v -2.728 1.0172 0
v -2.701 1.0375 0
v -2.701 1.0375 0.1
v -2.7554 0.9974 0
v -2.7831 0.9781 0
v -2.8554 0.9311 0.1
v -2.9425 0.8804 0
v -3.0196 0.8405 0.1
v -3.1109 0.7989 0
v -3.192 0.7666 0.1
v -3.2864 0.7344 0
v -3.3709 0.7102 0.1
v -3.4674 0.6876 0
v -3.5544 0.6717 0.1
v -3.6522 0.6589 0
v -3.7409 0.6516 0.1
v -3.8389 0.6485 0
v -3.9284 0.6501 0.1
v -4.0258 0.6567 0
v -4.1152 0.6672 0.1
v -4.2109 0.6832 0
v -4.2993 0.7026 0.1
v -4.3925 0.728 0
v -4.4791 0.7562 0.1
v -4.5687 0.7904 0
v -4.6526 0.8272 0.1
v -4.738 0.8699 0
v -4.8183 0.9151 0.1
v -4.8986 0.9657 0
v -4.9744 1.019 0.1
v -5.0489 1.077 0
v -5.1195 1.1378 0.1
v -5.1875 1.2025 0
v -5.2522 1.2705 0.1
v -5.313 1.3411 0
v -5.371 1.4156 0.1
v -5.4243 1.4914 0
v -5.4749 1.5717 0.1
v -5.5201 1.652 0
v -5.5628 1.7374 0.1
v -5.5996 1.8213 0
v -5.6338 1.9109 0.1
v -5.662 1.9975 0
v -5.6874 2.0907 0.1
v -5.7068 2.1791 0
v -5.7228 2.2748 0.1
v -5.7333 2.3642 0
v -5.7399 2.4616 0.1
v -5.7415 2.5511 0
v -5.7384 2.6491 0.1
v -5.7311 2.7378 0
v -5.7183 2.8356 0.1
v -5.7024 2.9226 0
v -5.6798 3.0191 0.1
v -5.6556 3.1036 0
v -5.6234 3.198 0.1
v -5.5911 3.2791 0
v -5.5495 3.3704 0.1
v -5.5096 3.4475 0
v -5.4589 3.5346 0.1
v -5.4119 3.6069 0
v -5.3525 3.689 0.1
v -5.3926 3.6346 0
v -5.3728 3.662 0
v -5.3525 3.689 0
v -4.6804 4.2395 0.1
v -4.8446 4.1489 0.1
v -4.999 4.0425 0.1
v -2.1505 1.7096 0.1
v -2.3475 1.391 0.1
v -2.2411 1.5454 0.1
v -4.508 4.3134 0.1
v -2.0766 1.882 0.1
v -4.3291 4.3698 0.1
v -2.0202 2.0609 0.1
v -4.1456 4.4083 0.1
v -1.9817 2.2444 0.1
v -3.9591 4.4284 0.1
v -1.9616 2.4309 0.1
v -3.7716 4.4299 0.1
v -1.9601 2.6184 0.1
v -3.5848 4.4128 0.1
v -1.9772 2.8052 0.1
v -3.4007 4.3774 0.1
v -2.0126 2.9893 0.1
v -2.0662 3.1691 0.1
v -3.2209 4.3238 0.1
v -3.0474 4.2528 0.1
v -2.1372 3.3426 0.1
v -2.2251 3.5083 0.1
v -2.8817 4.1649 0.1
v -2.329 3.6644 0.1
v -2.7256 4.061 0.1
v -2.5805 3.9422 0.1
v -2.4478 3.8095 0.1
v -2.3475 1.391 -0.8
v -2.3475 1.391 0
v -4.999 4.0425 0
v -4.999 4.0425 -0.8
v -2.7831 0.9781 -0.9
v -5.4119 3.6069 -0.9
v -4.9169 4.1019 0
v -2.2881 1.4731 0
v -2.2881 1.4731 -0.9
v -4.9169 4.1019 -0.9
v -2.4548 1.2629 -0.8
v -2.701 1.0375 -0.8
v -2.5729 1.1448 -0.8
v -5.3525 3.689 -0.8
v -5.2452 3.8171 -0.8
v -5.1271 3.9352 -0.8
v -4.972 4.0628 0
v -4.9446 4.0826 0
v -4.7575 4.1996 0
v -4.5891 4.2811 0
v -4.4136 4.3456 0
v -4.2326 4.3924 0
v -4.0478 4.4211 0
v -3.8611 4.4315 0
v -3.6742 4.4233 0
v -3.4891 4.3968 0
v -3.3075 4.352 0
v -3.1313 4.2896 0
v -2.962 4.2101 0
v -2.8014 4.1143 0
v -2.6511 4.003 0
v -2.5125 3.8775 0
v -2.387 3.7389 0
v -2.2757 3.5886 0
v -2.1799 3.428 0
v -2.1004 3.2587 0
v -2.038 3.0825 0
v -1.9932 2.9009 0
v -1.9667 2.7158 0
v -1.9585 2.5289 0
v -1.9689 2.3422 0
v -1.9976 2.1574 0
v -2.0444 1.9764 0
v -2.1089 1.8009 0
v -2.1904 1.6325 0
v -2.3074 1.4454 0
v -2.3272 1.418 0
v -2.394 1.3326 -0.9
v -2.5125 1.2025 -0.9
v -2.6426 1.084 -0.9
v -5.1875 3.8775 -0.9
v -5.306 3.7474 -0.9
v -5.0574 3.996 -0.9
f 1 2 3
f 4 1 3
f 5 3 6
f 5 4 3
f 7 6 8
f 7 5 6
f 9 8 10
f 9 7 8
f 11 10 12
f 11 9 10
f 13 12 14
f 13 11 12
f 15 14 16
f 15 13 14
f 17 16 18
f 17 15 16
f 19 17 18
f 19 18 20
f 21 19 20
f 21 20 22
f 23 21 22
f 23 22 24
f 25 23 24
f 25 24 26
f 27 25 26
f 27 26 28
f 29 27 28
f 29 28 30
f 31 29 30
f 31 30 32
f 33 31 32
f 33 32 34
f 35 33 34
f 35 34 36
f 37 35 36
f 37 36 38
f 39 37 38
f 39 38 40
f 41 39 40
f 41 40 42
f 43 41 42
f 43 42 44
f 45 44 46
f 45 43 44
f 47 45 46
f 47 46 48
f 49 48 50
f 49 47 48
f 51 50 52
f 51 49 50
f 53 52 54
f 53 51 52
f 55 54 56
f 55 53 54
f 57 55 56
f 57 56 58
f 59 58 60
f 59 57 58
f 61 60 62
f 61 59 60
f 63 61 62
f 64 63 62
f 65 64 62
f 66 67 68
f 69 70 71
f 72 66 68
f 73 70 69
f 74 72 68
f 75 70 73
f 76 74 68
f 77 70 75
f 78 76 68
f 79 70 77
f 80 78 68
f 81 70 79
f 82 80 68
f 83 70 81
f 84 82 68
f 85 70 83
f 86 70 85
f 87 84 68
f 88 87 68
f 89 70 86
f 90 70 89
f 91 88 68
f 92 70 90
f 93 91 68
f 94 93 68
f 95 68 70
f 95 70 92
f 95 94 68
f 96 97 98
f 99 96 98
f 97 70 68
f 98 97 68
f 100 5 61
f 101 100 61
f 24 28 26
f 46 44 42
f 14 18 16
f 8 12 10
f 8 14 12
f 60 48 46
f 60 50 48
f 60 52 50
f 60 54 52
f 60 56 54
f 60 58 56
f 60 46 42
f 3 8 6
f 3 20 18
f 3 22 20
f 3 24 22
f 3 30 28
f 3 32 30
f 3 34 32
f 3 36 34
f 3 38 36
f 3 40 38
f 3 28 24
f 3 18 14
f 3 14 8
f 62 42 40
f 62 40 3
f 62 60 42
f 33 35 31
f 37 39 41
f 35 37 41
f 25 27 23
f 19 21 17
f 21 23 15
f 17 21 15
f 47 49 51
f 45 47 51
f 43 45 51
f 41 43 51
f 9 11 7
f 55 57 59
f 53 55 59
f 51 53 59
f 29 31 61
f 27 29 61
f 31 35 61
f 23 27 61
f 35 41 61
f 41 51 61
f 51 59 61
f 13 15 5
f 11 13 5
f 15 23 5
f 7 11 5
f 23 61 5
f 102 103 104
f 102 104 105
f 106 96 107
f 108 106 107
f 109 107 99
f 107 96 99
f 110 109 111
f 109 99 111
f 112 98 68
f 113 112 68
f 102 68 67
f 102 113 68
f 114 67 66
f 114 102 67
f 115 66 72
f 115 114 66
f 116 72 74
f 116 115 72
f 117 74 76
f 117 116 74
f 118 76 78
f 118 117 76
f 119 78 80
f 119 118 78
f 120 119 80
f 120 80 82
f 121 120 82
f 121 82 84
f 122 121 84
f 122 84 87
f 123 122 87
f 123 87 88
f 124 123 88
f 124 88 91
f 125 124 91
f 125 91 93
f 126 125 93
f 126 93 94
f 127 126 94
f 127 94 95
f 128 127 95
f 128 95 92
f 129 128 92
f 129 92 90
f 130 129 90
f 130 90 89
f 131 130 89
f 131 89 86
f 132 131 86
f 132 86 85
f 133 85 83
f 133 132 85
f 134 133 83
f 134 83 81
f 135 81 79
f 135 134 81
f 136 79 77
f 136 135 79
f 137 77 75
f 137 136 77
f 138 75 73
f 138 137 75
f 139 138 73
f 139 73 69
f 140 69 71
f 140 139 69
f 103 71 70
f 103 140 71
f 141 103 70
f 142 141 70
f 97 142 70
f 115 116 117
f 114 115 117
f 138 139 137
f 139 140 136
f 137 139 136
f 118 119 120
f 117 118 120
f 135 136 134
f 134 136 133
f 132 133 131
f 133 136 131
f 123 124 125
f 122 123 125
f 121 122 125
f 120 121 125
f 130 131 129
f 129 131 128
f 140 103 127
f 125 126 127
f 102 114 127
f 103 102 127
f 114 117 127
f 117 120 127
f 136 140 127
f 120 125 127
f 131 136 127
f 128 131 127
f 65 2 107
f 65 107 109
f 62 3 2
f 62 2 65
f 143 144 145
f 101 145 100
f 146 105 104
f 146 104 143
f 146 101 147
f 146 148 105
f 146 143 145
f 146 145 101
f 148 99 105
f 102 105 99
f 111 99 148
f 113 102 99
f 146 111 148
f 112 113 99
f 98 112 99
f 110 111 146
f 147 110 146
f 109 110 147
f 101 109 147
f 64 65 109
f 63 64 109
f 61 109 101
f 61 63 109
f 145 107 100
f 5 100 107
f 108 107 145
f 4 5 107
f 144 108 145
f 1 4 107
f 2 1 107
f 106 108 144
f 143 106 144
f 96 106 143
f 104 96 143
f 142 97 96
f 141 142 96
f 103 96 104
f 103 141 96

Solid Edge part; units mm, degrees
sketch "Sketch1" plane through (0, 0, 0) normal (0, 0, 1) x (1, 0, 0)
  circle A0 centre (-3.85, 2.54) radius 1.8915
extrude "Protrusion1" add sketch "Sketch1" along normal blind 0.1
sketch "Sketch2" plane through (-3.85, 2.54, 0.1) normal (0, 0, 1) x (0, 1, 0)
  line L0 (-1.5619, -1.0669) -> (1.0669, 1.5619)
  arc A0 (1.0669, 1.5619) -> (1.5619, 1.0669) centre (0, 0) cw
  line L1 (-1.0669, -1.5619) -> (1.5619, 1.0669)
  arc A1 (-1.0669, -1.5619) -> (-1.5619, -1.0669) centre (0, 0) cw
extrude "Ausprägung_2" add sketch "Sketch2" against normal blind 1
sketch "Sketch3" plane through (-3.85, 2.54, 0.1) normal (0, 0, 1) x (0, 1, 0)
  line L0 (-1.5025, -1.149) -> (1.149, 1.5025)
  line L1 (-1.149, -1.5025) -> (1.5025, 1.149)
  arc A0 (-1.149, -1.5025) -> (-1.5025, -1.149) centre (0, 0) cw
  arc A1 (1.149, 1.5025) -> (1.5025, 1.149) centre (0, 0) cw
extrude "Ausschnitt_1" cut sketch "Sketch3" against normal blind 0.9
